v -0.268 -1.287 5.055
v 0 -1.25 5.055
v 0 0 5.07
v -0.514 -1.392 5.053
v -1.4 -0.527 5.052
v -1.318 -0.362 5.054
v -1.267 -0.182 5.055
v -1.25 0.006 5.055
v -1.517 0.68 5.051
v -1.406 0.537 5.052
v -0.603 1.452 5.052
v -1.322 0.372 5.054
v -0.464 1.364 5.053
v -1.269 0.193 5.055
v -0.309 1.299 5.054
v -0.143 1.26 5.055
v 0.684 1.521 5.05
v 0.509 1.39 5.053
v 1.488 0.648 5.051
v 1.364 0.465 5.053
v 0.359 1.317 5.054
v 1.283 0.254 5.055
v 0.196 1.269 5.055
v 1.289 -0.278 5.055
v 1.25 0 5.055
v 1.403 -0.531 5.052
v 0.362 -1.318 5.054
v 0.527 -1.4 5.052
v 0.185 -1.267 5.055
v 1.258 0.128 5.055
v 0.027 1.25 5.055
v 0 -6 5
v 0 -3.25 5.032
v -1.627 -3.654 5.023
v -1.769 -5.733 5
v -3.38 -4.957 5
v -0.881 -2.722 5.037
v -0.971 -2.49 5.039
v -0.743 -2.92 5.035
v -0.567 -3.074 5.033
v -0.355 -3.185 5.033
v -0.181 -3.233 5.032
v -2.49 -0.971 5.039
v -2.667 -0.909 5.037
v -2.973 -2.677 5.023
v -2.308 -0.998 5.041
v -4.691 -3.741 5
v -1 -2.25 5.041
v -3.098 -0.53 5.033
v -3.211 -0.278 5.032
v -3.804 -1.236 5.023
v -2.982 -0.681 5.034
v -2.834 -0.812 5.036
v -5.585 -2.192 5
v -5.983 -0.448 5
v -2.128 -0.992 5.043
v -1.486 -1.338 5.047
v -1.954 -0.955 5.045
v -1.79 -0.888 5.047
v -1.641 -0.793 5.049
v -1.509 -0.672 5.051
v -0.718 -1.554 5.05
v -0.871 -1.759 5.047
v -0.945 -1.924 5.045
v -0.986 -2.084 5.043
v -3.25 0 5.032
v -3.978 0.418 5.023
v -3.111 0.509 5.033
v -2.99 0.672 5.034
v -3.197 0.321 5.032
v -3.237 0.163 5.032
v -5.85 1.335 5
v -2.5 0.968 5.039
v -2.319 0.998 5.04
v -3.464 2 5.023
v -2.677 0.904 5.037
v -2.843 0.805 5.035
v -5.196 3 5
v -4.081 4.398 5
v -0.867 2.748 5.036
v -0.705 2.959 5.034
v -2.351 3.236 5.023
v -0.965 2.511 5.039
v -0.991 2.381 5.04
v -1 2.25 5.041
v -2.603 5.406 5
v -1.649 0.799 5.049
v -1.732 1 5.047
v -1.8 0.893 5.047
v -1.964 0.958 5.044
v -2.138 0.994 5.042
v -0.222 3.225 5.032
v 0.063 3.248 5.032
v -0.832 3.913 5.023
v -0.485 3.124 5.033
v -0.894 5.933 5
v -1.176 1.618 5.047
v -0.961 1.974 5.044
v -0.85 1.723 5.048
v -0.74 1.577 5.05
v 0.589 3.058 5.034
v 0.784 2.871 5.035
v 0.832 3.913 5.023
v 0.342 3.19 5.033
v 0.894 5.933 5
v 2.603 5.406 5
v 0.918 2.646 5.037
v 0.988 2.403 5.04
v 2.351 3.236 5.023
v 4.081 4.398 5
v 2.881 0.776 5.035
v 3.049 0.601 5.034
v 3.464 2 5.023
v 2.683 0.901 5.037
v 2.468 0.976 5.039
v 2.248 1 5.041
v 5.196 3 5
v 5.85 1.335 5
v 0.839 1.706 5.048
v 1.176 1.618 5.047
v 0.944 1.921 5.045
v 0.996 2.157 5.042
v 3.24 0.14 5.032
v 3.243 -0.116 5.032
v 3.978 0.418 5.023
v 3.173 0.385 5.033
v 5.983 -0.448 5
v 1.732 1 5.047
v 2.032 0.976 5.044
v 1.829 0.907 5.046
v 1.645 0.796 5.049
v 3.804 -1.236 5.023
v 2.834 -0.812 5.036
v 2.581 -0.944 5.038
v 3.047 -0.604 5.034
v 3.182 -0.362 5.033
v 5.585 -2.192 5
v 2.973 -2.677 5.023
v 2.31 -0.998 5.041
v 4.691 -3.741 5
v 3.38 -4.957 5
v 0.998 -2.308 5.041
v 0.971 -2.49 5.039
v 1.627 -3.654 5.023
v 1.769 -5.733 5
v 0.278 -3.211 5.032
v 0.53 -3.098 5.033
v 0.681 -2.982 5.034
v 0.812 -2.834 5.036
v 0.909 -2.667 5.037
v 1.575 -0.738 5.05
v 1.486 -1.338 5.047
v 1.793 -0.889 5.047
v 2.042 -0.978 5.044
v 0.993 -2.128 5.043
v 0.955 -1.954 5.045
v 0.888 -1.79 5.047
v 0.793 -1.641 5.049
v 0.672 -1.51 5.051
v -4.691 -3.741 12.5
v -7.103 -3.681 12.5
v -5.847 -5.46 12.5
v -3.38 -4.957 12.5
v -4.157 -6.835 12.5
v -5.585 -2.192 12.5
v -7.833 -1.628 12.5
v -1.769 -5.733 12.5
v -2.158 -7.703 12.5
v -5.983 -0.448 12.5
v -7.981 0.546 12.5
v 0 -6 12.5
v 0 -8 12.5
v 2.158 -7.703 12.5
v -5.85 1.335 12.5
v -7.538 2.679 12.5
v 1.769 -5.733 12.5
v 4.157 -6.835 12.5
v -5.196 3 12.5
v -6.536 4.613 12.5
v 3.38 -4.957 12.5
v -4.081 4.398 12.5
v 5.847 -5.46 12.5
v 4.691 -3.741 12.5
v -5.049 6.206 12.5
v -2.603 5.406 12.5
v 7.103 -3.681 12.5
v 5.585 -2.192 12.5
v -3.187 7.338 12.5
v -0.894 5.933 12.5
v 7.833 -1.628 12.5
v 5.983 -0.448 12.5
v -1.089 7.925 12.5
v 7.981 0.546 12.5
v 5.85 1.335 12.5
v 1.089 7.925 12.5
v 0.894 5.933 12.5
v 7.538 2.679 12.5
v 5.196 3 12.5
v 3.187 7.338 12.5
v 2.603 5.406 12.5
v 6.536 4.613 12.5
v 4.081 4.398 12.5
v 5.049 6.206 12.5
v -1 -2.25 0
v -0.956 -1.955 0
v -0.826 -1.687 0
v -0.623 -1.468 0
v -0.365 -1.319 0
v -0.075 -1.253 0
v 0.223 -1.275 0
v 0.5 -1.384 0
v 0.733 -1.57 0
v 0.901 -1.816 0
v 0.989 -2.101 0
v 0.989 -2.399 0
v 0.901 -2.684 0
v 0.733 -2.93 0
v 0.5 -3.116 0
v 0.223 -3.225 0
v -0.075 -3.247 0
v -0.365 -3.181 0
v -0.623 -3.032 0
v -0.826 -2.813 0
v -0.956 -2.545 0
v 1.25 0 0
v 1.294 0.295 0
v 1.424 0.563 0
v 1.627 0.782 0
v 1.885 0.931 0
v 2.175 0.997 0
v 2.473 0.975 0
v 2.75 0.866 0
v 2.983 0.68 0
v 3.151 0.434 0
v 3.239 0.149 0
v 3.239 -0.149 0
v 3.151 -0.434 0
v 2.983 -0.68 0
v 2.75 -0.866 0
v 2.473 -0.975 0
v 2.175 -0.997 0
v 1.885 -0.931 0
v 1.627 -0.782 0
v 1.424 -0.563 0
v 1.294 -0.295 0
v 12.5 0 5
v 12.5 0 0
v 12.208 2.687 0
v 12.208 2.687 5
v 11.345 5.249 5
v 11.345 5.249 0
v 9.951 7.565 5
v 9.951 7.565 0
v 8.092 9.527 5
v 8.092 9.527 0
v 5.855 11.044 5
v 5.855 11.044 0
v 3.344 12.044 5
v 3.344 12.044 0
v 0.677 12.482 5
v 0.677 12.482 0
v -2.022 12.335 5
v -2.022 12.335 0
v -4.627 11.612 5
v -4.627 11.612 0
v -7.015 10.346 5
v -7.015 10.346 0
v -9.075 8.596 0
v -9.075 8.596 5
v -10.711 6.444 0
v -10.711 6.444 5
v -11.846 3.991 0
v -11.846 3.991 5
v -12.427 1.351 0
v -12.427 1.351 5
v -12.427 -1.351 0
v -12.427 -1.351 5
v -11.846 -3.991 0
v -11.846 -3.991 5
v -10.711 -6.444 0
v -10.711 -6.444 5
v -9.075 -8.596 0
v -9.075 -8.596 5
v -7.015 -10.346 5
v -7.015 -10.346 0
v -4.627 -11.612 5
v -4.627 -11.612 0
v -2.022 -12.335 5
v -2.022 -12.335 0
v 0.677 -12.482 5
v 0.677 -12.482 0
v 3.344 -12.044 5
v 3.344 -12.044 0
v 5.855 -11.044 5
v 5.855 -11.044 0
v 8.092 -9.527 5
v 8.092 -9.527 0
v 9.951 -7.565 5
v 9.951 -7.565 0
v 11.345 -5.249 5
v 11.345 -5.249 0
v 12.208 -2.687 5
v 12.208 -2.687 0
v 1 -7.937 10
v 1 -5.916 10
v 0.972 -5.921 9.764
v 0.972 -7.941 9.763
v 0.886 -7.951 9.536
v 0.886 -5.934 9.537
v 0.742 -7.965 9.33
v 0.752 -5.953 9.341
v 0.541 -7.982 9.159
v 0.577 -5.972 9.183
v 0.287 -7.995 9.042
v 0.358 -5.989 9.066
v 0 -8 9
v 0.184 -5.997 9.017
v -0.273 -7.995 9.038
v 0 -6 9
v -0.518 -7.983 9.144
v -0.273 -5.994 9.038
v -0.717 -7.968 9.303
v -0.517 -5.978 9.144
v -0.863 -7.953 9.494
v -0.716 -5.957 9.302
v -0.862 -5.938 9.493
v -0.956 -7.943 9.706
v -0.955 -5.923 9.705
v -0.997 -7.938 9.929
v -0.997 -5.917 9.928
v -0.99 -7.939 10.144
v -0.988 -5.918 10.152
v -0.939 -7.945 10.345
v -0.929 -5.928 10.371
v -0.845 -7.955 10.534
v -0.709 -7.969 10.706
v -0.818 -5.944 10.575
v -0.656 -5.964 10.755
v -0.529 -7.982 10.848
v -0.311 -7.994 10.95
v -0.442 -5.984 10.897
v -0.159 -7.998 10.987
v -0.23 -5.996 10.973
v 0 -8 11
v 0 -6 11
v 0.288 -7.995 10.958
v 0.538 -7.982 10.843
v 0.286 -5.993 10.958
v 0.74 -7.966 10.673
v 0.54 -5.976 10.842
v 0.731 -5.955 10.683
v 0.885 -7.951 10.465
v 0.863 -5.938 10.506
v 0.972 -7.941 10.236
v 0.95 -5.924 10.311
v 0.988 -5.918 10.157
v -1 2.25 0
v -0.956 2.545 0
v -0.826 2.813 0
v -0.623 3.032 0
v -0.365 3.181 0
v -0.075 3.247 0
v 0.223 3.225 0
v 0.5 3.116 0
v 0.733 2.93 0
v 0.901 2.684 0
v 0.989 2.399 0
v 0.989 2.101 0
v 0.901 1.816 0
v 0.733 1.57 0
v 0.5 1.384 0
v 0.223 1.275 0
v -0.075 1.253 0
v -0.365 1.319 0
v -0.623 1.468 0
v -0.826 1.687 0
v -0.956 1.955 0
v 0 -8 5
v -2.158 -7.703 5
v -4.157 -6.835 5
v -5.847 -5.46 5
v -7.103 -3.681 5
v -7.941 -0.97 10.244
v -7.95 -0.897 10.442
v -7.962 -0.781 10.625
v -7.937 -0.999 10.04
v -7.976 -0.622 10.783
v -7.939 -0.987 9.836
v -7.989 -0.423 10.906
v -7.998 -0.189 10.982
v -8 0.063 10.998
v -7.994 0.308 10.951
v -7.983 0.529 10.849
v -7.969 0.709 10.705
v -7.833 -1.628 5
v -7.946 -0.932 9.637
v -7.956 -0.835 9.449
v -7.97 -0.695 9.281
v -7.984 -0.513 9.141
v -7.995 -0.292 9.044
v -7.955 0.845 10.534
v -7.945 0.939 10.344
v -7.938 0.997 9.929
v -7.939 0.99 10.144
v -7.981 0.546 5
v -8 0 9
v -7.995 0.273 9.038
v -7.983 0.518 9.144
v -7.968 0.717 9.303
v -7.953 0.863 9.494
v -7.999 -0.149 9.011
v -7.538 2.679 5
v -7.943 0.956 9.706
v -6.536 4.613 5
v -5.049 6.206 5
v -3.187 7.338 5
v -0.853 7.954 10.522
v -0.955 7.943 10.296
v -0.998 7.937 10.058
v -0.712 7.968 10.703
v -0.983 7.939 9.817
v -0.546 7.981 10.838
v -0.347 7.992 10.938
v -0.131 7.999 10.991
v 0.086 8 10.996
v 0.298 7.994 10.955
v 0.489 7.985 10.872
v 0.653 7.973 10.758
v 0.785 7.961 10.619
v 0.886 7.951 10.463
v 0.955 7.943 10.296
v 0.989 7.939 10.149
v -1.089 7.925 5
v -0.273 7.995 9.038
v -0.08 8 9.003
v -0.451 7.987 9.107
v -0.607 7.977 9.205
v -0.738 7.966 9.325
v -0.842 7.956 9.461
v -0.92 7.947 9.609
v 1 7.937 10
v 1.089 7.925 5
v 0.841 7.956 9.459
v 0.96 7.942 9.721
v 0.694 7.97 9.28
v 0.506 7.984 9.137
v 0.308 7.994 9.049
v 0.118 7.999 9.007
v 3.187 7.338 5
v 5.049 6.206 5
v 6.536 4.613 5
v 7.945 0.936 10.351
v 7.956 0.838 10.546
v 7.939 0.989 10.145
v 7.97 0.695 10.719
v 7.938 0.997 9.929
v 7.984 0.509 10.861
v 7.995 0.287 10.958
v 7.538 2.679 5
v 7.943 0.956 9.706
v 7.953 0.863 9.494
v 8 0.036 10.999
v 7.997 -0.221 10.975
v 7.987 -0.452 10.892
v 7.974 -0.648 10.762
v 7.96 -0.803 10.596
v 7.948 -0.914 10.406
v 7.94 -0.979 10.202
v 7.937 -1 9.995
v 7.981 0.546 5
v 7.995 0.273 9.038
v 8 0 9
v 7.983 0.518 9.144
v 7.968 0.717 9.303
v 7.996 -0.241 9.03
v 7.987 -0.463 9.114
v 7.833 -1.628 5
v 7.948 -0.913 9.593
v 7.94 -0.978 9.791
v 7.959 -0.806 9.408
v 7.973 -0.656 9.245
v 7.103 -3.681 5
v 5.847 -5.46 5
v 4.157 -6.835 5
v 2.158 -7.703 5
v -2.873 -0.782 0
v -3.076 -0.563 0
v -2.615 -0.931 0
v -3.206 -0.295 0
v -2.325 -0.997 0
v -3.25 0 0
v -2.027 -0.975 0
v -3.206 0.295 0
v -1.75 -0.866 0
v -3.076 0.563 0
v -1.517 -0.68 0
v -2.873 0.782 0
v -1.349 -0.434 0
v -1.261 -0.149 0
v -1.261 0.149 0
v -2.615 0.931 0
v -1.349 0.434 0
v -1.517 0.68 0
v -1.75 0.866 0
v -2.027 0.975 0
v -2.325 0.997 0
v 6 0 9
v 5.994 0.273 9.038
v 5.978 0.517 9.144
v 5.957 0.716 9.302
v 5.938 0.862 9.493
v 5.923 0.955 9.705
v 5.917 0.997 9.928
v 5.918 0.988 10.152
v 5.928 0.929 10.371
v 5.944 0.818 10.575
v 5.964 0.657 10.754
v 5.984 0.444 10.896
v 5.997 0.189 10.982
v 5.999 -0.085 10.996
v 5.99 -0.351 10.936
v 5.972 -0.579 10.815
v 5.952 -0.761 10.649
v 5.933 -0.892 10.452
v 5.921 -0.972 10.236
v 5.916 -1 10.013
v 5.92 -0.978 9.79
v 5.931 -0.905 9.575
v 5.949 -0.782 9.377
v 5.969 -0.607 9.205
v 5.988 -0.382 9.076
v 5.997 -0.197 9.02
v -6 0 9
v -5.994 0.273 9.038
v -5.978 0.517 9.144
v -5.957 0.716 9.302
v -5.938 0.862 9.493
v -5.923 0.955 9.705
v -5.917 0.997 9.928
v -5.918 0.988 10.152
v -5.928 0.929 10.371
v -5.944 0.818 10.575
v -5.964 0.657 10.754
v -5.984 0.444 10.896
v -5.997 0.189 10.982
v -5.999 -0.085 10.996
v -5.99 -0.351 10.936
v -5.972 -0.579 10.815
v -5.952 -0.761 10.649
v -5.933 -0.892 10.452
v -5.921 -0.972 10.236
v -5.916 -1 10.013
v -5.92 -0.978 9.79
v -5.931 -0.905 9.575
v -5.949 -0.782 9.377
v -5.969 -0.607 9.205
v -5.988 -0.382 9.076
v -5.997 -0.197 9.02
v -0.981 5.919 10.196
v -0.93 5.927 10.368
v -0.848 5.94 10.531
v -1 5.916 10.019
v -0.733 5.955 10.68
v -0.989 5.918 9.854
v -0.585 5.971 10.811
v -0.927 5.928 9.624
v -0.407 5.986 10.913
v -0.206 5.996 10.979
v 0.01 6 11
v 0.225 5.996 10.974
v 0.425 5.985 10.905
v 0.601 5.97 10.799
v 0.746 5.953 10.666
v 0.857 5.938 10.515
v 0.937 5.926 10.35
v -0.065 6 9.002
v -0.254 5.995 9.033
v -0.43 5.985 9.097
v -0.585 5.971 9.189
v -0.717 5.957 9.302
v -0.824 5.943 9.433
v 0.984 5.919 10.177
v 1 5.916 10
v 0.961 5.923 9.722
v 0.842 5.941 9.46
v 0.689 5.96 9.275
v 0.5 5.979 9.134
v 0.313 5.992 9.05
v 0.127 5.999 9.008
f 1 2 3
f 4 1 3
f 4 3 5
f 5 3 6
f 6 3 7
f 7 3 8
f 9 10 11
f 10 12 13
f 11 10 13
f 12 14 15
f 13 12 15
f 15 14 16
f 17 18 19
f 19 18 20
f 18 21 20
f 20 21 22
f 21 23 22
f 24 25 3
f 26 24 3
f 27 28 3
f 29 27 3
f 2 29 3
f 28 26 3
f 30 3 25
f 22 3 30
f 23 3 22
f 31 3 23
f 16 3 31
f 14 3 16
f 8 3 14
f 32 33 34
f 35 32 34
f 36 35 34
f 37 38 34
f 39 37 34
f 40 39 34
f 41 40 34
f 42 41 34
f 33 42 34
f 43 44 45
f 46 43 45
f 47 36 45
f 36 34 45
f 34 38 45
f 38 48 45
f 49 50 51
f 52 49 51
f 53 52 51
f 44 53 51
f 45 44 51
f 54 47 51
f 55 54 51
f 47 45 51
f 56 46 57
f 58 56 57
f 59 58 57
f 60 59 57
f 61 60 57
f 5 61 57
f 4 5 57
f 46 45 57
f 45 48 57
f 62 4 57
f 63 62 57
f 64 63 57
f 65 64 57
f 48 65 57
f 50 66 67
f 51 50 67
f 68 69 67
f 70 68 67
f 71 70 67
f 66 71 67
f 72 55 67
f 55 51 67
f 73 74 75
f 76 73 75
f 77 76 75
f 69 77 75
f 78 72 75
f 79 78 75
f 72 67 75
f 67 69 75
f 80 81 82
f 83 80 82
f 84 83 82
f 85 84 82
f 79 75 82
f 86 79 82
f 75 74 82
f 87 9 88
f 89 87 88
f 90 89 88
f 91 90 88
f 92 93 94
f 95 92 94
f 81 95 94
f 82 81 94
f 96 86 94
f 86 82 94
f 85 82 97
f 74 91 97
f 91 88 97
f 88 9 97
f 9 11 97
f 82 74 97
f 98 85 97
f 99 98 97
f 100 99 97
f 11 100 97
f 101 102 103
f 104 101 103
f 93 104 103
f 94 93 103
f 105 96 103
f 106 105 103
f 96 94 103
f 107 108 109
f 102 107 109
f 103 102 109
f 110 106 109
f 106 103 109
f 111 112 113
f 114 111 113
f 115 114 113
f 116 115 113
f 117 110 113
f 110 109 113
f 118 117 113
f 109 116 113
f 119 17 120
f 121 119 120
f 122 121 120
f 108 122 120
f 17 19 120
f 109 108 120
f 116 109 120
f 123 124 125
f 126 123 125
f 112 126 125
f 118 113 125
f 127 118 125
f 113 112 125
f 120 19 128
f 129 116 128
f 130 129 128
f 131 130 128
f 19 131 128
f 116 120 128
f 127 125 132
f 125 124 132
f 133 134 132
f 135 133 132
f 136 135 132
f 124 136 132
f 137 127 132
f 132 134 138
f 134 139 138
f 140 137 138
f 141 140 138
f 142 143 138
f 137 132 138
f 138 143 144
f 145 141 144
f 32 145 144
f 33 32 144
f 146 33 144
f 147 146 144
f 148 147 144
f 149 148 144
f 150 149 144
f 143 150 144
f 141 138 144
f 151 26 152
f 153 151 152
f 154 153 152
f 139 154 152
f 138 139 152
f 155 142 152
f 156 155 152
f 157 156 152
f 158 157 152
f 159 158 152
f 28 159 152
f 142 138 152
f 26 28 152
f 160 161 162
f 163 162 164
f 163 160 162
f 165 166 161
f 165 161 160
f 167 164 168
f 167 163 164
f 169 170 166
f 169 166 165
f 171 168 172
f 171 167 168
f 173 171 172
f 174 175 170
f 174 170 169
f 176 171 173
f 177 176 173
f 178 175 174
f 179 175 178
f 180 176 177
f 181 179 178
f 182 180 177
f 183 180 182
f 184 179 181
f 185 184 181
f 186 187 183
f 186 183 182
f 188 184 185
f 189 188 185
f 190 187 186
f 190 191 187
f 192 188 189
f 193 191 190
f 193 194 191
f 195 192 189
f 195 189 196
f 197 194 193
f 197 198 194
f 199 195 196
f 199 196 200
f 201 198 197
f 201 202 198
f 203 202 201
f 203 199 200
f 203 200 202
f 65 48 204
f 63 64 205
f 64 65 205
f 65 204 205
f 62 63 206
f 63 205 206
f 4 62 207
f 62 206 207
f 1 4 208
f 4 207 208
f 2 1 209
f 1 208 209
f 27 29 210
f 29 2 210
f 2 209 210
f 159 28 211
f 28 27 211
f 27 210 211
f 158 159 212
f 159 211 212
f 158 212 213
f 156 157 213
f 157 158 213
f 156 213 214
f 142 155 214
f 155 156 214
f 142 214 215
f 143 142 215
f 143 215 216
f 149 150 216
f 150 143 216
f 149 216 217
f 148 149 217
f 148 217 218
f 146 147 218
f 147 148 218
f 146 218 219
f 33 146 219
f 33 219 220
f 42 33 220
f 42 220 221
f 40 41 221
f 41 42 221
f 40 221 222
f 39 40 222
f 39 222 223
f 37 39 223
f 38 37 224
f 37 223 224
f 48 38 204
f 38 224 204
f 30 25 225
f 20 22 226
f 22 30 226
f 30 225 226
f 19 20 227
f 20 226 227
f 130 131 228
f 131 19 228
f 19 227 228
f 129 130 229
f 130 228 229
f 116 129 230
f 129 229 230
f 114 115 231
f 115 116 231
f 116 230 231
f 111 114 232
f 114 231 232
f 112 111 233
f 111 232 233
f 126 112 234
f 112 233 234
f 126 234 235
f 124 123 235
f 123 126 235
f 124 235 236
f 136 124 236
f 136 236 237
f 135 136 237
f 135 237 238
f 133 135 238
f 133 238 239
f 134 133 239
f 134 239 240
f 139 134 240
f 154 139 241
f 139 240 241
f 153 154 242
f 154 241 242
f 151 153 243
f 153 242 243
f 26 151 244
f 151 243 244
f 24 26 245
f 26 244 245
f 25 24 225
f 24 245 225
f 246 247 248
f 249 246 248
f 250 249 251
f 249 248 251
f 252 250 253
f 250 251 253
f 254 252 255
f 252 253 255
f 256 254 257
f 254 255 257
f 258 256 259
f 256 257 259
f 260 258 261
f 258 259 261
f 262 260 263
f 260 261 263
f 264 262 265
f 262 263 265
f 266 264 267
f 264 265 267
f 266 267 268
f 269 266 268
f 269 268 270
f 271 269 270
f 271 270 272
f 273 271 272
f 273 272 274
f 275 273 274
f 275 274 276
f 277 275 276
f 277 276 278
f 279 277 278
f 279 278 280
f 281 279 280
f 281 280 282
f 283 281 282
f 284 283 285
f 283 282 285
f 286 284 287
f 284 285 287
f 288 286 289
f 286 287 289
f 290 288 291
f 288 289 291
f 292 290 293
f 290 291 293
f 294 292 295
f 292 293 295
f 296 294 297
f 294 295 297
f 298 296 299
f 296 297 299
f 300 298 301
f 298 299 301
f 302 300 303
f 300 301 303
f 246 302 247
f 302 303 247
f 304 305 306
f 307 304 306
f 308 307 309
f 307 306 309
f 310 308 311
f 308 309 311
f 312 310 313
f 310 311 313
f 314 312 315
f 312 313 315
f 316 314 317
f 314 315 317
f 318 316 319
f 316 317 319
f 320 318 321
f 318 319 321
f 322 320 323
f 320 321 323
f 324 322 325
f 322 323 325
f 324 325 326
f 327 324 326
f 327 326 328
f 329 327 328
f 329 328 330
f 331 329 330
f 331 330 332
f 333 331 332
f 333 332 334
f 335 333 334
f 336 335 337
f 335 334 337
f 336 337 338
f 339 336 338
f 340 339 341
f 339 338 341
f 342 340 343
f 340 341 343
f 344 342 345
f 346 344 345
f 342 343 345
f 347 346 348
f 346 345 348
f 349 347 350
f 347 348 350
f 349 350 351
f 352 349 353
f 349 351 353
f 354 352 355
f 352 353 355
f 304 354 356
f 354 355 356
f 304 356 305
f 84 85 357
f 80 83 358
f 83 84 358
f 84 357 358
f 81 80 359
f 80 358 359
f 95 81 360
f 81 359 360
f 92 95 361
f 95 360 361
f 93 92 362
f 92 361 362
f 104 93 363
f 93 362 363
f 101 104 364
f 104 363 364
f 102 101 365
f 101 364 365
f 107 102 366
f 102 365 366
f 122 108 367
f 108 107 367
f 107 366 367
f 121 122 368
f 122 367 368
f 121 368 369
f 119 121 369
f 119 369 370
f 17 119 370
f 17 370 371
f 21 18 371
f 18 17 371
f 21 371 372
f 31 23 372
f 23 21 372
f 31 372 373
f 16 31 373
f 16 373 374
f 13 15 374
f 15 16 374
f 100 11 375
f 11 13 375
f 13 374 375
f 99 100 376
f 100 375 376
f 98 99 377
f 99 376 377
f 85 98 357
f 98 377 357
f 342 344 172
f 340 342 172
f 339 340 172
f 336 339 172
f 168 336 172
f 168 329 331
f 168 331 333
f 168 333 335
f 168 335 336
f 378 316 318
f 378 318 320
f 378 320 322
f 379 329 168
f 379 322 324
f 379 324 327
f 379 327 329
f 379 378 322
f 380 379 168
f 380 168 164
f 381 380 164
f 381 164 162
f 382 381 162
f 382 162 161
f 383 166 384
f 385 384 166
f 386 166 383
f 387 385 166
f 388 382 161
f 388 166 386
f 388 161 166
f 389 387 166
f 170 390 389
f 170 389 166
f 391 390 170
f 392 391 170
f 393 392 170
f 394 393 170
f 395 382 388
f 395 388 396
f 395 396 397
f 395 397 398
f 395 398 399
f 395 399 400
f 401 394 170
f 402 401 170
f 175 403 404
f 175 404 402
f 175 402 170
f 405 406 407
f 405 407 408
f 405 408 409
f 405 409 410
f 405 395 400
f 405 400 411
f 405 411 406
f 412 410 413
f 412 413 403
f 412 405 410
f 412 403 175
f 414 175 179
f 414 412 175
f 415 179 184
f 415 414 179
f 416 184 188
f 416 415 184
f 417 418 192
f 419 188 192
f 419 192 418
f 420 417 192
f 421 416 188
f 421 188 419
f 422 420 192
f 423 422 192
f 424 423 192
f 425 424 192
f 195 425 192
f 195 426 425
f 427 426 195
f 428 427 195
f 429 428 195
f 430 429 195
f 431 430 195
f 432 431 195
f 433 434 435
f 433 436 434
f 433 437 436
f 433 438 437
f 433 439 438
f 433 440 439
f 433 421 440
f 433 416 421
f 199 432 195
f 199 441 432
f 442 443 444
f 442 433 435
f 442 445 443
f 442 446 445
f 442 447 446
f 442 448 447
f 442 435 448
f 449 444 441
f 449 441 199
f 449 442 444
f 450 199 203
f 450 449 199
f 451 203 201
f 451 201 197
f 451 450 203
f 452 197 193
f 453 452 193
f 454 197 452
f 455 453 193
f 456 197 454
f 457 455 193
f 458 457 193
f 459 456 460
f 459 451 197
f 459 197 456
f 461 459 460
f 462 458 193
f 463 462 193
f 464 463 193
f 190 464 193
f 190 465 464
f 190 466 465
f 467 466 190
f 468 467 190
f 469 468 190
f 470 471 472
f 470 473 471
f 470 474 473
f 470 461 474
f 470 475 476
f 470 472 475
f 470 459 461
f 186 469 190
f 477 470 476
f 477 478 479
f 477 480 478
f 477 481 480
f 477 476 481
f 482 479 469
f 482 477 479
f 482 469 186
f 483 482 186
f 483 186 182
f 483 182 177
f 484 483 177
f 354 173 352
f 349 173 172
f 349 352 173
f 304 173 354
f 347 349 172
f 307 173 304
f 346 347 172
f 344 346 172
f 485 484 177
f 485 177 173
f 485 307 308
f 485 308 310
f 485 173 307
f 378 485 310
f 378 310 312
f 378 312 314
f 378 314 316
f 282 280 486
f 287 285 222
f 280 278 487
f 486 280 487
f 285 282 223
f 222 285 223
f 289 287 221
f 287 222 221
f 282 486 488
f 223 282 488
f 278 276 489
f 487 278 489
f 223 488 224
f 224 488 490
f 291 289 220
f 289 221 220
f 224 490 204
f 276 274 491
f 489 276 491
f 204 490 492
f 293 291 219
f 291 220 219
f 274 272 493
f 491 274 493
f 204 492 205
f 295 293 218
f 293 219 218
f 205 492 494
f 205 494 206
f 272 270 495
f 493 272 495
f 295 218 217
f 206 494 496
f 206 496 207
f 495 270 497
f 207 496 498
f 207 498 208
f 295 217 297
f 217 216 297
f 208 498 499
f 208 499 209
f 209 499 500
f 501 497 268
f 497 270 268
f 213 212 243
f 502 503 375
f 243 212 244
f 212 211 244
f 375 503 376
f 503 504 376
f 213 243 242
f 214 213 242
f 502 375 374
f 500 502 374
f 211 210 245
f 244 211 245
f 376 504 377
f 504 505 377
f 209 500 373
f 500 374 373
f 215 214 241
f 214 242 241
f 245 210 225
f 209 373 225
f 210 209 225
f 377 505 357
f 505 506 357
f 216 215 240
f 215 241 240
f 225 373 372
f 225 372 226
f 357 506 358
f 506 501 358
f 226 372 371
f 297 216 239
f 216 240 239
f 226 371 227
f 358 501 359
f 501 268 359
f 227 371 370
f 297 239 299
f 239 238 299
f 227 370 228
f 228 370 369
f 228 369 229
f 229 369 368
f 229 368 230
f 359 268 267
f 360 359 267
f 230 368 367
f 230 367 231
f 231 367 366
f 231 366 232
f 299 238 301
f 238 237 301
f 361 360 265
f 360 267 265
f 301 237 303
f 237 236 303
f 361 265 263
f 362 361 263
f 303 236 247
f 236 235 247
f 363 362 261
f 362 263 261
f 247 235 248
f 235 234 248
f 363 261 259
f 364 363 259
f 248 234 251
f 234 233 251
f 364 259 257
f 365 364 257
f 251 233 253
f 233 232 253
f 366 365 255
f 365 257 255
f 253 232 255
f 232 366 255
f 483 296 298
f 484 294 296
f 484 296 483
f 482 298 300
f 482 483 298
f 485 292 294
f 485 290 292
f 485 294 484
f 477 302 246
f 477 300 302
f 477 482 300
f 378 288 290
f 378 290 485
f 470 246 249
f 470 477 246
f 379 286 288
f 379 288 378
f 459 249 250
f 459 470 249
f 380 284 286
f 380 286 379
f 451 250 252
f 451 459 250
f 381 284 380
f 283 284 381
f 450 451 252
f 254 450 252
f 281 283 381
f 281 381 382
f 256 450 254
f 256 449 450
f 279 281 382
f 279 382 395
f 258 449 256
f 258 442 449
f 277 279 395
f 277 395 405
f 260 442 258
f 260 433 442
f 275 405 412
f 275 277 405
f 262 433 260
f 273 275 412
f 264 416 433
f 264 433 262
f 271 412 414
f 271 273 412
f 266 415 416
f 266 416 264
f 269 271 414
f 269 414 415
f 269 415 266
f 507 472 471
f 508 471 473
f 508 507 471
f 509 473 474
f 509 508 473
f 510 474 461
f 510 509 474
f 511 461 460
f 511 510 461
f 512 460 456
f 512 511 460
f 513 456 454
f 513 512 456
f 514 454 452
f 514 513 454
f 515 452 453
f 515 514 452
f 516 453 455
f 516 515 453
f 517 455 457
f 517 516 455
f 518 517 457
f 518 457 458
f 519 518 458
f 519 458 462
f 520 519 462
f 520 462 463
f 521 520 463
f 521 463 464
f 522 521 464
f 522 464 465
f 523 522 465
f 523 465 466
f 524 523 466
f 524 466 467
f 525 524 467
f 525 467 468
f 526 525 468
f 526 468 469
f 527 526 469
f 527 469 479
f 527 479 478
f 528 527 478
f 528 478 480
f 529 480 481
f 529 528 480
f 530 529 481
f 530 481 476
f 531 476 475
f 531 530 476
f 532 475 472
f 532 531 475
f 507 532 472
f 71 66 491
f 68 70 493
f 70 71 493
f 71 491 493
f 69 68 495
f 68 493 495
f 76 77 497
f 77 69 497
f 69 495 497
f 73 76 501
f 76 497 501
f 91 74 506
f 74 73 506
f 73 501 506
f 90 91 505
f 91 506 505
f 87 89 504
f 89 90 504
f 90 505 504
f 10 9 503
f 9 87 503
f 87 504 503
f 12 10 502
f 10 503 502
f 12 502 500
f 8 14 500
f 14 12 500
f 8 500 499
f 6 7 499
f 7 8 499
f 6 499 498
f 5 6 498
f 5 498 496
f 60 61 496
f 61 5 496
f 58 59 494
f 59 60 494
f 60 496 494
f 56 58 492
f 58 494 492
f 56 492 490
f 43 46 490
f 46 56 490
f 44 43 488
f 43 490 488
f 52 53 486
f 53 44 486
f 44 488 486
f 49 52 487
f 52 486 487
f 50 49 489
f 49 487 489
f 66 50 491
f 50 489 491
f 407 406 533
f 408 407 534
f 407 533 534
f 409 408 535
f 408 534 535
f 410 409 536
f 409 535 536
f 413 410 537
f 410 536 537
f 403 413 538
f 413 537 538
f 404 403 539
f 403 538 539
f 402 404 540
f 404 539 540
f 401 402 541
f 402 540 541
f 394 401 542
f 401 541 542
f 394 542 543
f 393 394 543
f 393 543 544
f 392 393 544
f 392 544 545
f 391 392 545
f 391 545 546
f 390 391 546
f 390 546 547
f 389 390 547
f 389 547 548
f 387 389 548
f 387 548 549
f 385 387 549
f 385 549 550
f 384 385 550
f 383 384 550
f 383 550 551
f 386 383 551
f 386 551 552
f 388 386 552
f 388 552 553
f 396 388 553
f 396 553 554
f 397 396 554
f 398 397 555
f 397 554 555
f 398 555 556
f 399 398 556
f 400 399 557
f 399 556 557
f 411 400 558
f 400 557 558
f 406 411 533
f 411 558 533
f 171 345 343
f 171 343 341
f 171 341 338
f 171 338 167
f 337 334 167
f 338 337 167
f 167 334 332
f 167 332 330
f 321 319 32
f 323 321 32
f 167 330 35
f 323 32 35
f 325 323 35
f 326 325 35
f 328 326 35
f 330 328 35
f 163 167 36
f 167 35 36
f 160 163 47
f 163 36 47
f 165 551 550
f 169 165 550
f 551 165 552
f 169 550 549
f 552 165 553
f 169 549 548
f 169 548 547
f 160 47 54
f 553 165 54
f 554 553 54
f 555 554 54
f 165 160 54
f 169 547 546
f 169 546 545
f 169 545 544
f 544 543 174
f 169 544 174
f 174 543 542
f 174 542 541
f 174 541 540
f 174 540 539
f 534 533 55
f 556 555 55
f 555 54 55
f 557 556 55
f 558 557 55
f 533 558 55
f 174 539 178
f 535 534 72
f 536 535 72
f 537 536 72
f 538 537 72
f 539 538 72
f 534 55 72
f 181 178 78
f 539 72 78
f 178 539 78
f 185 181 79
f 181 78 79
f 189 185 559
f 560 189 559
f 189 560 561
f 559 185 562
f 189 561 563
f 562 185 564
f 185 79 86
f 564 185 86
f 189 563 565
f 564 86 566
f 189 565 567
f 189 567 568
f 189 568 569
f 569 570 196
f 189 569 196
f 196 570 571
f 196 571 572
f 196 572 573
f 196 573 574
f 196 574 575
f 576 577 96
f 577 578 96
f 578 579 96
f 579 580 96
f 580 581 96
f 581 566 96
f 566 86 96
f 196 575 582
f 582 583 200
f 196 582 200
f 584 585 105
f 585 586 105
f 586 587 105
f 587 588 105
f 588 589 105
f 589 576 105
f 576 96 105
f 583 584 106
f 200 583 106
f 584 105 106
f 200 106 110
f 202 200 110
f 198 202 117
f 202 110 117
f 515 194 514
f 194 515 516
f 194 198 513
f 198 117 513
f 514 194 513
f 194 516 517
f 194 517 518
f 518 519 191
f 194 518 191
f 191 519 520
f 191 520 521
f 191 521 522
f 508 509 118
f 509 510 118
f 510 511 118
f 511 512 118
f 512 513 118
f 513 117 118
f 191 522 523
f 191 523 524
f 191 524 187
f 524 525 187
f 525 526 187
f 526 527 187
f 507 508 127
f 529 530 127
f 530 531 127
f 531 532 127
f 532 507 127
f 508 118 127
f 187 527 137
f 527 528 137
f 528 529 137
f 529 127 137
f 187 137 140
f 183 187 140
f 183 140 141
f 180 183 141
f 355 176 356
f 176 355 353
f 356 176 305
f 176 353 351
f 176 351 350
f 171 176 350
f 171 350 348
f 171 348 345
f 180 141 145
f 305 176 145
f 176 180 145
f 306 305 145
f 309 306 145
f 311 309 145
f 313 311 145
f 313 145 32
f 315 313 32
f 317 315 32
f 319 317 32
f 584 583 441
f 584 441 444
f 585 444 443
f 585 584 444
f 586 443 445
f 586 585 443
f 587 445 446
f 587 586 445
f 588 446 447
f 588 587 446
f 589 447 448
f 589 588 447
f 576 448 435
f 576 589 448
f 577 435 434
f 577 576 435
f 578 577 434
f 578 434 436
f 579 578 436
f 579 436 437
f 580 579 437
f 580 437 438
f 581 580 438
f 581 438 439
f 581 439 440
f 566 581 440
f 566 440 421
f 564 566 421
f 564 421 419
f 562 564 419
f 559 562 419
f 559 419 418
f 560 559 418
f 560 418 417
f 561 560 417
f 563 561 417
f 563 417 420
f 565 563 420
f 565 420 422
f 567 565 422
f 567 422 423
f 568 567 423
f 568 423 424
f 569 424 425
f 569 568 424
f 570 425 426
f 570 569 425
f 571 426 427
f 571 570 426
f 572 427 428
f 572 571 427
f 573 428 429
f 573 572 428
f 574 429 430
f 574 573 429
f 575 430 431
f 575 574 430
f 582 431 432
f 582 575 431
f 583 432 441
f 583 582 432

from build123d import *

# Parameters (mm, degrees)
SKIZZE1_R                            = 12.5
AUFSATZ_LINEAR_AUSTRAGEN1_DEPTH      = 40
SCHNITT_LINEAR_START                 = 30
SKIZZE4_R                            = 15
SKIZZE4_R_2                          = 12
SCHNITT_LINEAR_AUSTRAGEN1_DEPTH      = 20
SKIZZE5_R                            = 1.1
SCHNITT_LINEAR_AUSTRAGEN2_DEPTH      = 20
SKIZZE6_R                            = 1
SCHNITT_LINEAR_AUSTRAGEN3_DEPTH      = 10
SCHNITT_LINEAR_START_2               = 12.5
SKIZZE8_W                            = 25
SKIZZE8_H                            = 25
SCHNITT_LINEAR_AUSTRAGEN4_DEPTH      = 28.5
SKIZZE9_R                            = 1
SCHNITT_LINEAR_AUSTRAGEN5_DEPTH      = 13.5
SCHNITT_LINEAR_AUSTRAGEN5_DEPTH_BACK = 13.5
SKIZZE10_R                           = 1
SCHNITT_LINEAR_AUSTRAGEN6_DEPTH      = 13.5
SCHNITT_LINEAR_AUSTRAGEN6_DEPTH_BACK = 13.5


with BuildPart() as part:
    # Skizze1 → Aufsatz-Linear austragen1 (new body)
    with BuildSketch(Plane.XY):
        Circle(SKIZZE1_R)
    extrude(amount=AUFSATZ_LINEAR_AUSTRAGEN1_DEPTH)

    # Skizze2 → Schnitt-Rotation3 (revolve, cut)
    with BuildSketch(Plane(origin=(0, 0, 0), x_dir=(0, 0, -1), z_dir=(1, 0, 0))):
        Polygon((-35, -12.5), (-35, -8), (-5, -8), (-5, -12.5), (-33.974333956, -17.5), align=None)
    revolve(axis=Axis((0, 0, 40), (0, 0, -1)), mode=Mode.SUBTRACT)

    # Skizze4 → Schnitt-Linear austragen1 (cut)
    with BuildSketch(Plane.XY.offset(SCHNITT_LINEAR_START)):
        Circle(SKIZZE4_R)
        Circle(SKIZZE4_R_2, mode=Mode.SUBTRACT)
    extrude(amount=SCHNITT_LINEAR_AUSTRAGEN1_DEPTH, mode=Mode.SUBTRACT)

    # Skizze5 → Schnitt-Linear austragen2 (cut)
    with BuildSketch(Plane.XY.offset(40)):
        with Locations((-5.457266806, 6.503717322)):
            Circle(SKIZZE5_R)
        with Locations((6.503717322, 5.457266806)):
            Circle(SKIZZE5_R)
        with Locations((5.457266806, -6.503717322)):
            Circle(SKIZZE5_R)
        with Locations((-6.503717322, -5.457266806)):
            Circle(SKIZZE5_R)
    extrude(amount=-SCHNITT_LINEAR_AUSTRAGEN2_DEPTH, mode=Mode.SUBTRACT)

    # Skizze6 → Schnitt-Linear austragen3 (cut)
    with BuildSketch(Plane(origin=(0, 0, 0), x_dir=(-1, 0, 0), z_dir=(0, 0, -1))):
        with Locations((-2.25, 0)):
            Circle(SKIZZE6_R)
        with Locations((0, 2.25)):
            Circle(SKIZZE6_R)
        with Locations((2.25, 0)):
            Circle(SKIZZE6_R)
        with Locations((0, -2.25)):
            Circle(SKIZZE6_R)
    extrude(amount=-SCHNITT_LINEAR_AUSTRAGEN3_DEPTH, mode=Mode.SUBTRACT)

    # Skizze7 → Schnitt-Rotation4 (revolve, cut)
    with BuildSketch(Plane(origin=(0, 0, 0), x_dir=(0, 0, -1), z_dir=(1, 0, 0))):
        Polygon((-5.069914244, 0), (-35.074978214, 0), (-40, 0), (-42.313201415, 0), (-42.313201415, -6), (-40, -6), (-35, -6), (-5, -6), align=None)
    revolve(axis=Axis((0, 0, 40), (0, 0, -1)), mode=Mode.SUBTRACT)

    # Skizze8 → Schnitt-Linear austragen4 (cut, through all)
    with BuildSketch(Plane.XY.offset(SCHNITT_LINEAR_START_2)):
        Rectangle(SKIZZE8_W, SKIZZE8_H)
    extrude(amount=SCHNITT_LINEAR_AUSTRAGEN4_DEPTH, mode=Mode.SUBTRACT)

    # Skizze9 → Schnitt-Linear austragen5 (cut, two sides)
    with BuildSketch(Plane(origin=(0, 0, 0), x_dir=(0, 0, -1), z_dir=(1, 0, 0))) as schnitt_linear_austragen5_sk:
        with Locations((-10, 0)):
            Circle(SKIZZE9_R)
    extrude(amount=SCHNITT_LINEAR_AUSTRAGEN5_DEPTH, mode=Mode.SUBTRACT)
    extrude(schnitt_linear_austragen5_sk.sketch, amount=-SCHNITT_LINEAR_AUSTRAGEN5_DEPTH_BACK, mode=Mode.SUBTRACT)

    # Skizze10 → Schnitt-Linear austragen6 (cut, two sides)
    with BuildSketch(Plane(origin=(0, 0, 0), x_dir=(1, 0, 0), z_dir=(0, 1, 0))) as schnitt_linear_austragen6_sk:
        with Locations((0, -10)):
            Circle(SKIZZE10_R)
    extrude(amount=SCHNITT_LINEAR_AUSTRAGEN6_DEPTH, mode=Mode.SUBTRACT)
    extrude(schnitt_linear_austragen6_sk.sketch, amount=-SCHNITT_LINEAR_AUSTRAGEN6_DEPTH_BACK, mode=Mode.SUBTRACT)


solid = part.part
